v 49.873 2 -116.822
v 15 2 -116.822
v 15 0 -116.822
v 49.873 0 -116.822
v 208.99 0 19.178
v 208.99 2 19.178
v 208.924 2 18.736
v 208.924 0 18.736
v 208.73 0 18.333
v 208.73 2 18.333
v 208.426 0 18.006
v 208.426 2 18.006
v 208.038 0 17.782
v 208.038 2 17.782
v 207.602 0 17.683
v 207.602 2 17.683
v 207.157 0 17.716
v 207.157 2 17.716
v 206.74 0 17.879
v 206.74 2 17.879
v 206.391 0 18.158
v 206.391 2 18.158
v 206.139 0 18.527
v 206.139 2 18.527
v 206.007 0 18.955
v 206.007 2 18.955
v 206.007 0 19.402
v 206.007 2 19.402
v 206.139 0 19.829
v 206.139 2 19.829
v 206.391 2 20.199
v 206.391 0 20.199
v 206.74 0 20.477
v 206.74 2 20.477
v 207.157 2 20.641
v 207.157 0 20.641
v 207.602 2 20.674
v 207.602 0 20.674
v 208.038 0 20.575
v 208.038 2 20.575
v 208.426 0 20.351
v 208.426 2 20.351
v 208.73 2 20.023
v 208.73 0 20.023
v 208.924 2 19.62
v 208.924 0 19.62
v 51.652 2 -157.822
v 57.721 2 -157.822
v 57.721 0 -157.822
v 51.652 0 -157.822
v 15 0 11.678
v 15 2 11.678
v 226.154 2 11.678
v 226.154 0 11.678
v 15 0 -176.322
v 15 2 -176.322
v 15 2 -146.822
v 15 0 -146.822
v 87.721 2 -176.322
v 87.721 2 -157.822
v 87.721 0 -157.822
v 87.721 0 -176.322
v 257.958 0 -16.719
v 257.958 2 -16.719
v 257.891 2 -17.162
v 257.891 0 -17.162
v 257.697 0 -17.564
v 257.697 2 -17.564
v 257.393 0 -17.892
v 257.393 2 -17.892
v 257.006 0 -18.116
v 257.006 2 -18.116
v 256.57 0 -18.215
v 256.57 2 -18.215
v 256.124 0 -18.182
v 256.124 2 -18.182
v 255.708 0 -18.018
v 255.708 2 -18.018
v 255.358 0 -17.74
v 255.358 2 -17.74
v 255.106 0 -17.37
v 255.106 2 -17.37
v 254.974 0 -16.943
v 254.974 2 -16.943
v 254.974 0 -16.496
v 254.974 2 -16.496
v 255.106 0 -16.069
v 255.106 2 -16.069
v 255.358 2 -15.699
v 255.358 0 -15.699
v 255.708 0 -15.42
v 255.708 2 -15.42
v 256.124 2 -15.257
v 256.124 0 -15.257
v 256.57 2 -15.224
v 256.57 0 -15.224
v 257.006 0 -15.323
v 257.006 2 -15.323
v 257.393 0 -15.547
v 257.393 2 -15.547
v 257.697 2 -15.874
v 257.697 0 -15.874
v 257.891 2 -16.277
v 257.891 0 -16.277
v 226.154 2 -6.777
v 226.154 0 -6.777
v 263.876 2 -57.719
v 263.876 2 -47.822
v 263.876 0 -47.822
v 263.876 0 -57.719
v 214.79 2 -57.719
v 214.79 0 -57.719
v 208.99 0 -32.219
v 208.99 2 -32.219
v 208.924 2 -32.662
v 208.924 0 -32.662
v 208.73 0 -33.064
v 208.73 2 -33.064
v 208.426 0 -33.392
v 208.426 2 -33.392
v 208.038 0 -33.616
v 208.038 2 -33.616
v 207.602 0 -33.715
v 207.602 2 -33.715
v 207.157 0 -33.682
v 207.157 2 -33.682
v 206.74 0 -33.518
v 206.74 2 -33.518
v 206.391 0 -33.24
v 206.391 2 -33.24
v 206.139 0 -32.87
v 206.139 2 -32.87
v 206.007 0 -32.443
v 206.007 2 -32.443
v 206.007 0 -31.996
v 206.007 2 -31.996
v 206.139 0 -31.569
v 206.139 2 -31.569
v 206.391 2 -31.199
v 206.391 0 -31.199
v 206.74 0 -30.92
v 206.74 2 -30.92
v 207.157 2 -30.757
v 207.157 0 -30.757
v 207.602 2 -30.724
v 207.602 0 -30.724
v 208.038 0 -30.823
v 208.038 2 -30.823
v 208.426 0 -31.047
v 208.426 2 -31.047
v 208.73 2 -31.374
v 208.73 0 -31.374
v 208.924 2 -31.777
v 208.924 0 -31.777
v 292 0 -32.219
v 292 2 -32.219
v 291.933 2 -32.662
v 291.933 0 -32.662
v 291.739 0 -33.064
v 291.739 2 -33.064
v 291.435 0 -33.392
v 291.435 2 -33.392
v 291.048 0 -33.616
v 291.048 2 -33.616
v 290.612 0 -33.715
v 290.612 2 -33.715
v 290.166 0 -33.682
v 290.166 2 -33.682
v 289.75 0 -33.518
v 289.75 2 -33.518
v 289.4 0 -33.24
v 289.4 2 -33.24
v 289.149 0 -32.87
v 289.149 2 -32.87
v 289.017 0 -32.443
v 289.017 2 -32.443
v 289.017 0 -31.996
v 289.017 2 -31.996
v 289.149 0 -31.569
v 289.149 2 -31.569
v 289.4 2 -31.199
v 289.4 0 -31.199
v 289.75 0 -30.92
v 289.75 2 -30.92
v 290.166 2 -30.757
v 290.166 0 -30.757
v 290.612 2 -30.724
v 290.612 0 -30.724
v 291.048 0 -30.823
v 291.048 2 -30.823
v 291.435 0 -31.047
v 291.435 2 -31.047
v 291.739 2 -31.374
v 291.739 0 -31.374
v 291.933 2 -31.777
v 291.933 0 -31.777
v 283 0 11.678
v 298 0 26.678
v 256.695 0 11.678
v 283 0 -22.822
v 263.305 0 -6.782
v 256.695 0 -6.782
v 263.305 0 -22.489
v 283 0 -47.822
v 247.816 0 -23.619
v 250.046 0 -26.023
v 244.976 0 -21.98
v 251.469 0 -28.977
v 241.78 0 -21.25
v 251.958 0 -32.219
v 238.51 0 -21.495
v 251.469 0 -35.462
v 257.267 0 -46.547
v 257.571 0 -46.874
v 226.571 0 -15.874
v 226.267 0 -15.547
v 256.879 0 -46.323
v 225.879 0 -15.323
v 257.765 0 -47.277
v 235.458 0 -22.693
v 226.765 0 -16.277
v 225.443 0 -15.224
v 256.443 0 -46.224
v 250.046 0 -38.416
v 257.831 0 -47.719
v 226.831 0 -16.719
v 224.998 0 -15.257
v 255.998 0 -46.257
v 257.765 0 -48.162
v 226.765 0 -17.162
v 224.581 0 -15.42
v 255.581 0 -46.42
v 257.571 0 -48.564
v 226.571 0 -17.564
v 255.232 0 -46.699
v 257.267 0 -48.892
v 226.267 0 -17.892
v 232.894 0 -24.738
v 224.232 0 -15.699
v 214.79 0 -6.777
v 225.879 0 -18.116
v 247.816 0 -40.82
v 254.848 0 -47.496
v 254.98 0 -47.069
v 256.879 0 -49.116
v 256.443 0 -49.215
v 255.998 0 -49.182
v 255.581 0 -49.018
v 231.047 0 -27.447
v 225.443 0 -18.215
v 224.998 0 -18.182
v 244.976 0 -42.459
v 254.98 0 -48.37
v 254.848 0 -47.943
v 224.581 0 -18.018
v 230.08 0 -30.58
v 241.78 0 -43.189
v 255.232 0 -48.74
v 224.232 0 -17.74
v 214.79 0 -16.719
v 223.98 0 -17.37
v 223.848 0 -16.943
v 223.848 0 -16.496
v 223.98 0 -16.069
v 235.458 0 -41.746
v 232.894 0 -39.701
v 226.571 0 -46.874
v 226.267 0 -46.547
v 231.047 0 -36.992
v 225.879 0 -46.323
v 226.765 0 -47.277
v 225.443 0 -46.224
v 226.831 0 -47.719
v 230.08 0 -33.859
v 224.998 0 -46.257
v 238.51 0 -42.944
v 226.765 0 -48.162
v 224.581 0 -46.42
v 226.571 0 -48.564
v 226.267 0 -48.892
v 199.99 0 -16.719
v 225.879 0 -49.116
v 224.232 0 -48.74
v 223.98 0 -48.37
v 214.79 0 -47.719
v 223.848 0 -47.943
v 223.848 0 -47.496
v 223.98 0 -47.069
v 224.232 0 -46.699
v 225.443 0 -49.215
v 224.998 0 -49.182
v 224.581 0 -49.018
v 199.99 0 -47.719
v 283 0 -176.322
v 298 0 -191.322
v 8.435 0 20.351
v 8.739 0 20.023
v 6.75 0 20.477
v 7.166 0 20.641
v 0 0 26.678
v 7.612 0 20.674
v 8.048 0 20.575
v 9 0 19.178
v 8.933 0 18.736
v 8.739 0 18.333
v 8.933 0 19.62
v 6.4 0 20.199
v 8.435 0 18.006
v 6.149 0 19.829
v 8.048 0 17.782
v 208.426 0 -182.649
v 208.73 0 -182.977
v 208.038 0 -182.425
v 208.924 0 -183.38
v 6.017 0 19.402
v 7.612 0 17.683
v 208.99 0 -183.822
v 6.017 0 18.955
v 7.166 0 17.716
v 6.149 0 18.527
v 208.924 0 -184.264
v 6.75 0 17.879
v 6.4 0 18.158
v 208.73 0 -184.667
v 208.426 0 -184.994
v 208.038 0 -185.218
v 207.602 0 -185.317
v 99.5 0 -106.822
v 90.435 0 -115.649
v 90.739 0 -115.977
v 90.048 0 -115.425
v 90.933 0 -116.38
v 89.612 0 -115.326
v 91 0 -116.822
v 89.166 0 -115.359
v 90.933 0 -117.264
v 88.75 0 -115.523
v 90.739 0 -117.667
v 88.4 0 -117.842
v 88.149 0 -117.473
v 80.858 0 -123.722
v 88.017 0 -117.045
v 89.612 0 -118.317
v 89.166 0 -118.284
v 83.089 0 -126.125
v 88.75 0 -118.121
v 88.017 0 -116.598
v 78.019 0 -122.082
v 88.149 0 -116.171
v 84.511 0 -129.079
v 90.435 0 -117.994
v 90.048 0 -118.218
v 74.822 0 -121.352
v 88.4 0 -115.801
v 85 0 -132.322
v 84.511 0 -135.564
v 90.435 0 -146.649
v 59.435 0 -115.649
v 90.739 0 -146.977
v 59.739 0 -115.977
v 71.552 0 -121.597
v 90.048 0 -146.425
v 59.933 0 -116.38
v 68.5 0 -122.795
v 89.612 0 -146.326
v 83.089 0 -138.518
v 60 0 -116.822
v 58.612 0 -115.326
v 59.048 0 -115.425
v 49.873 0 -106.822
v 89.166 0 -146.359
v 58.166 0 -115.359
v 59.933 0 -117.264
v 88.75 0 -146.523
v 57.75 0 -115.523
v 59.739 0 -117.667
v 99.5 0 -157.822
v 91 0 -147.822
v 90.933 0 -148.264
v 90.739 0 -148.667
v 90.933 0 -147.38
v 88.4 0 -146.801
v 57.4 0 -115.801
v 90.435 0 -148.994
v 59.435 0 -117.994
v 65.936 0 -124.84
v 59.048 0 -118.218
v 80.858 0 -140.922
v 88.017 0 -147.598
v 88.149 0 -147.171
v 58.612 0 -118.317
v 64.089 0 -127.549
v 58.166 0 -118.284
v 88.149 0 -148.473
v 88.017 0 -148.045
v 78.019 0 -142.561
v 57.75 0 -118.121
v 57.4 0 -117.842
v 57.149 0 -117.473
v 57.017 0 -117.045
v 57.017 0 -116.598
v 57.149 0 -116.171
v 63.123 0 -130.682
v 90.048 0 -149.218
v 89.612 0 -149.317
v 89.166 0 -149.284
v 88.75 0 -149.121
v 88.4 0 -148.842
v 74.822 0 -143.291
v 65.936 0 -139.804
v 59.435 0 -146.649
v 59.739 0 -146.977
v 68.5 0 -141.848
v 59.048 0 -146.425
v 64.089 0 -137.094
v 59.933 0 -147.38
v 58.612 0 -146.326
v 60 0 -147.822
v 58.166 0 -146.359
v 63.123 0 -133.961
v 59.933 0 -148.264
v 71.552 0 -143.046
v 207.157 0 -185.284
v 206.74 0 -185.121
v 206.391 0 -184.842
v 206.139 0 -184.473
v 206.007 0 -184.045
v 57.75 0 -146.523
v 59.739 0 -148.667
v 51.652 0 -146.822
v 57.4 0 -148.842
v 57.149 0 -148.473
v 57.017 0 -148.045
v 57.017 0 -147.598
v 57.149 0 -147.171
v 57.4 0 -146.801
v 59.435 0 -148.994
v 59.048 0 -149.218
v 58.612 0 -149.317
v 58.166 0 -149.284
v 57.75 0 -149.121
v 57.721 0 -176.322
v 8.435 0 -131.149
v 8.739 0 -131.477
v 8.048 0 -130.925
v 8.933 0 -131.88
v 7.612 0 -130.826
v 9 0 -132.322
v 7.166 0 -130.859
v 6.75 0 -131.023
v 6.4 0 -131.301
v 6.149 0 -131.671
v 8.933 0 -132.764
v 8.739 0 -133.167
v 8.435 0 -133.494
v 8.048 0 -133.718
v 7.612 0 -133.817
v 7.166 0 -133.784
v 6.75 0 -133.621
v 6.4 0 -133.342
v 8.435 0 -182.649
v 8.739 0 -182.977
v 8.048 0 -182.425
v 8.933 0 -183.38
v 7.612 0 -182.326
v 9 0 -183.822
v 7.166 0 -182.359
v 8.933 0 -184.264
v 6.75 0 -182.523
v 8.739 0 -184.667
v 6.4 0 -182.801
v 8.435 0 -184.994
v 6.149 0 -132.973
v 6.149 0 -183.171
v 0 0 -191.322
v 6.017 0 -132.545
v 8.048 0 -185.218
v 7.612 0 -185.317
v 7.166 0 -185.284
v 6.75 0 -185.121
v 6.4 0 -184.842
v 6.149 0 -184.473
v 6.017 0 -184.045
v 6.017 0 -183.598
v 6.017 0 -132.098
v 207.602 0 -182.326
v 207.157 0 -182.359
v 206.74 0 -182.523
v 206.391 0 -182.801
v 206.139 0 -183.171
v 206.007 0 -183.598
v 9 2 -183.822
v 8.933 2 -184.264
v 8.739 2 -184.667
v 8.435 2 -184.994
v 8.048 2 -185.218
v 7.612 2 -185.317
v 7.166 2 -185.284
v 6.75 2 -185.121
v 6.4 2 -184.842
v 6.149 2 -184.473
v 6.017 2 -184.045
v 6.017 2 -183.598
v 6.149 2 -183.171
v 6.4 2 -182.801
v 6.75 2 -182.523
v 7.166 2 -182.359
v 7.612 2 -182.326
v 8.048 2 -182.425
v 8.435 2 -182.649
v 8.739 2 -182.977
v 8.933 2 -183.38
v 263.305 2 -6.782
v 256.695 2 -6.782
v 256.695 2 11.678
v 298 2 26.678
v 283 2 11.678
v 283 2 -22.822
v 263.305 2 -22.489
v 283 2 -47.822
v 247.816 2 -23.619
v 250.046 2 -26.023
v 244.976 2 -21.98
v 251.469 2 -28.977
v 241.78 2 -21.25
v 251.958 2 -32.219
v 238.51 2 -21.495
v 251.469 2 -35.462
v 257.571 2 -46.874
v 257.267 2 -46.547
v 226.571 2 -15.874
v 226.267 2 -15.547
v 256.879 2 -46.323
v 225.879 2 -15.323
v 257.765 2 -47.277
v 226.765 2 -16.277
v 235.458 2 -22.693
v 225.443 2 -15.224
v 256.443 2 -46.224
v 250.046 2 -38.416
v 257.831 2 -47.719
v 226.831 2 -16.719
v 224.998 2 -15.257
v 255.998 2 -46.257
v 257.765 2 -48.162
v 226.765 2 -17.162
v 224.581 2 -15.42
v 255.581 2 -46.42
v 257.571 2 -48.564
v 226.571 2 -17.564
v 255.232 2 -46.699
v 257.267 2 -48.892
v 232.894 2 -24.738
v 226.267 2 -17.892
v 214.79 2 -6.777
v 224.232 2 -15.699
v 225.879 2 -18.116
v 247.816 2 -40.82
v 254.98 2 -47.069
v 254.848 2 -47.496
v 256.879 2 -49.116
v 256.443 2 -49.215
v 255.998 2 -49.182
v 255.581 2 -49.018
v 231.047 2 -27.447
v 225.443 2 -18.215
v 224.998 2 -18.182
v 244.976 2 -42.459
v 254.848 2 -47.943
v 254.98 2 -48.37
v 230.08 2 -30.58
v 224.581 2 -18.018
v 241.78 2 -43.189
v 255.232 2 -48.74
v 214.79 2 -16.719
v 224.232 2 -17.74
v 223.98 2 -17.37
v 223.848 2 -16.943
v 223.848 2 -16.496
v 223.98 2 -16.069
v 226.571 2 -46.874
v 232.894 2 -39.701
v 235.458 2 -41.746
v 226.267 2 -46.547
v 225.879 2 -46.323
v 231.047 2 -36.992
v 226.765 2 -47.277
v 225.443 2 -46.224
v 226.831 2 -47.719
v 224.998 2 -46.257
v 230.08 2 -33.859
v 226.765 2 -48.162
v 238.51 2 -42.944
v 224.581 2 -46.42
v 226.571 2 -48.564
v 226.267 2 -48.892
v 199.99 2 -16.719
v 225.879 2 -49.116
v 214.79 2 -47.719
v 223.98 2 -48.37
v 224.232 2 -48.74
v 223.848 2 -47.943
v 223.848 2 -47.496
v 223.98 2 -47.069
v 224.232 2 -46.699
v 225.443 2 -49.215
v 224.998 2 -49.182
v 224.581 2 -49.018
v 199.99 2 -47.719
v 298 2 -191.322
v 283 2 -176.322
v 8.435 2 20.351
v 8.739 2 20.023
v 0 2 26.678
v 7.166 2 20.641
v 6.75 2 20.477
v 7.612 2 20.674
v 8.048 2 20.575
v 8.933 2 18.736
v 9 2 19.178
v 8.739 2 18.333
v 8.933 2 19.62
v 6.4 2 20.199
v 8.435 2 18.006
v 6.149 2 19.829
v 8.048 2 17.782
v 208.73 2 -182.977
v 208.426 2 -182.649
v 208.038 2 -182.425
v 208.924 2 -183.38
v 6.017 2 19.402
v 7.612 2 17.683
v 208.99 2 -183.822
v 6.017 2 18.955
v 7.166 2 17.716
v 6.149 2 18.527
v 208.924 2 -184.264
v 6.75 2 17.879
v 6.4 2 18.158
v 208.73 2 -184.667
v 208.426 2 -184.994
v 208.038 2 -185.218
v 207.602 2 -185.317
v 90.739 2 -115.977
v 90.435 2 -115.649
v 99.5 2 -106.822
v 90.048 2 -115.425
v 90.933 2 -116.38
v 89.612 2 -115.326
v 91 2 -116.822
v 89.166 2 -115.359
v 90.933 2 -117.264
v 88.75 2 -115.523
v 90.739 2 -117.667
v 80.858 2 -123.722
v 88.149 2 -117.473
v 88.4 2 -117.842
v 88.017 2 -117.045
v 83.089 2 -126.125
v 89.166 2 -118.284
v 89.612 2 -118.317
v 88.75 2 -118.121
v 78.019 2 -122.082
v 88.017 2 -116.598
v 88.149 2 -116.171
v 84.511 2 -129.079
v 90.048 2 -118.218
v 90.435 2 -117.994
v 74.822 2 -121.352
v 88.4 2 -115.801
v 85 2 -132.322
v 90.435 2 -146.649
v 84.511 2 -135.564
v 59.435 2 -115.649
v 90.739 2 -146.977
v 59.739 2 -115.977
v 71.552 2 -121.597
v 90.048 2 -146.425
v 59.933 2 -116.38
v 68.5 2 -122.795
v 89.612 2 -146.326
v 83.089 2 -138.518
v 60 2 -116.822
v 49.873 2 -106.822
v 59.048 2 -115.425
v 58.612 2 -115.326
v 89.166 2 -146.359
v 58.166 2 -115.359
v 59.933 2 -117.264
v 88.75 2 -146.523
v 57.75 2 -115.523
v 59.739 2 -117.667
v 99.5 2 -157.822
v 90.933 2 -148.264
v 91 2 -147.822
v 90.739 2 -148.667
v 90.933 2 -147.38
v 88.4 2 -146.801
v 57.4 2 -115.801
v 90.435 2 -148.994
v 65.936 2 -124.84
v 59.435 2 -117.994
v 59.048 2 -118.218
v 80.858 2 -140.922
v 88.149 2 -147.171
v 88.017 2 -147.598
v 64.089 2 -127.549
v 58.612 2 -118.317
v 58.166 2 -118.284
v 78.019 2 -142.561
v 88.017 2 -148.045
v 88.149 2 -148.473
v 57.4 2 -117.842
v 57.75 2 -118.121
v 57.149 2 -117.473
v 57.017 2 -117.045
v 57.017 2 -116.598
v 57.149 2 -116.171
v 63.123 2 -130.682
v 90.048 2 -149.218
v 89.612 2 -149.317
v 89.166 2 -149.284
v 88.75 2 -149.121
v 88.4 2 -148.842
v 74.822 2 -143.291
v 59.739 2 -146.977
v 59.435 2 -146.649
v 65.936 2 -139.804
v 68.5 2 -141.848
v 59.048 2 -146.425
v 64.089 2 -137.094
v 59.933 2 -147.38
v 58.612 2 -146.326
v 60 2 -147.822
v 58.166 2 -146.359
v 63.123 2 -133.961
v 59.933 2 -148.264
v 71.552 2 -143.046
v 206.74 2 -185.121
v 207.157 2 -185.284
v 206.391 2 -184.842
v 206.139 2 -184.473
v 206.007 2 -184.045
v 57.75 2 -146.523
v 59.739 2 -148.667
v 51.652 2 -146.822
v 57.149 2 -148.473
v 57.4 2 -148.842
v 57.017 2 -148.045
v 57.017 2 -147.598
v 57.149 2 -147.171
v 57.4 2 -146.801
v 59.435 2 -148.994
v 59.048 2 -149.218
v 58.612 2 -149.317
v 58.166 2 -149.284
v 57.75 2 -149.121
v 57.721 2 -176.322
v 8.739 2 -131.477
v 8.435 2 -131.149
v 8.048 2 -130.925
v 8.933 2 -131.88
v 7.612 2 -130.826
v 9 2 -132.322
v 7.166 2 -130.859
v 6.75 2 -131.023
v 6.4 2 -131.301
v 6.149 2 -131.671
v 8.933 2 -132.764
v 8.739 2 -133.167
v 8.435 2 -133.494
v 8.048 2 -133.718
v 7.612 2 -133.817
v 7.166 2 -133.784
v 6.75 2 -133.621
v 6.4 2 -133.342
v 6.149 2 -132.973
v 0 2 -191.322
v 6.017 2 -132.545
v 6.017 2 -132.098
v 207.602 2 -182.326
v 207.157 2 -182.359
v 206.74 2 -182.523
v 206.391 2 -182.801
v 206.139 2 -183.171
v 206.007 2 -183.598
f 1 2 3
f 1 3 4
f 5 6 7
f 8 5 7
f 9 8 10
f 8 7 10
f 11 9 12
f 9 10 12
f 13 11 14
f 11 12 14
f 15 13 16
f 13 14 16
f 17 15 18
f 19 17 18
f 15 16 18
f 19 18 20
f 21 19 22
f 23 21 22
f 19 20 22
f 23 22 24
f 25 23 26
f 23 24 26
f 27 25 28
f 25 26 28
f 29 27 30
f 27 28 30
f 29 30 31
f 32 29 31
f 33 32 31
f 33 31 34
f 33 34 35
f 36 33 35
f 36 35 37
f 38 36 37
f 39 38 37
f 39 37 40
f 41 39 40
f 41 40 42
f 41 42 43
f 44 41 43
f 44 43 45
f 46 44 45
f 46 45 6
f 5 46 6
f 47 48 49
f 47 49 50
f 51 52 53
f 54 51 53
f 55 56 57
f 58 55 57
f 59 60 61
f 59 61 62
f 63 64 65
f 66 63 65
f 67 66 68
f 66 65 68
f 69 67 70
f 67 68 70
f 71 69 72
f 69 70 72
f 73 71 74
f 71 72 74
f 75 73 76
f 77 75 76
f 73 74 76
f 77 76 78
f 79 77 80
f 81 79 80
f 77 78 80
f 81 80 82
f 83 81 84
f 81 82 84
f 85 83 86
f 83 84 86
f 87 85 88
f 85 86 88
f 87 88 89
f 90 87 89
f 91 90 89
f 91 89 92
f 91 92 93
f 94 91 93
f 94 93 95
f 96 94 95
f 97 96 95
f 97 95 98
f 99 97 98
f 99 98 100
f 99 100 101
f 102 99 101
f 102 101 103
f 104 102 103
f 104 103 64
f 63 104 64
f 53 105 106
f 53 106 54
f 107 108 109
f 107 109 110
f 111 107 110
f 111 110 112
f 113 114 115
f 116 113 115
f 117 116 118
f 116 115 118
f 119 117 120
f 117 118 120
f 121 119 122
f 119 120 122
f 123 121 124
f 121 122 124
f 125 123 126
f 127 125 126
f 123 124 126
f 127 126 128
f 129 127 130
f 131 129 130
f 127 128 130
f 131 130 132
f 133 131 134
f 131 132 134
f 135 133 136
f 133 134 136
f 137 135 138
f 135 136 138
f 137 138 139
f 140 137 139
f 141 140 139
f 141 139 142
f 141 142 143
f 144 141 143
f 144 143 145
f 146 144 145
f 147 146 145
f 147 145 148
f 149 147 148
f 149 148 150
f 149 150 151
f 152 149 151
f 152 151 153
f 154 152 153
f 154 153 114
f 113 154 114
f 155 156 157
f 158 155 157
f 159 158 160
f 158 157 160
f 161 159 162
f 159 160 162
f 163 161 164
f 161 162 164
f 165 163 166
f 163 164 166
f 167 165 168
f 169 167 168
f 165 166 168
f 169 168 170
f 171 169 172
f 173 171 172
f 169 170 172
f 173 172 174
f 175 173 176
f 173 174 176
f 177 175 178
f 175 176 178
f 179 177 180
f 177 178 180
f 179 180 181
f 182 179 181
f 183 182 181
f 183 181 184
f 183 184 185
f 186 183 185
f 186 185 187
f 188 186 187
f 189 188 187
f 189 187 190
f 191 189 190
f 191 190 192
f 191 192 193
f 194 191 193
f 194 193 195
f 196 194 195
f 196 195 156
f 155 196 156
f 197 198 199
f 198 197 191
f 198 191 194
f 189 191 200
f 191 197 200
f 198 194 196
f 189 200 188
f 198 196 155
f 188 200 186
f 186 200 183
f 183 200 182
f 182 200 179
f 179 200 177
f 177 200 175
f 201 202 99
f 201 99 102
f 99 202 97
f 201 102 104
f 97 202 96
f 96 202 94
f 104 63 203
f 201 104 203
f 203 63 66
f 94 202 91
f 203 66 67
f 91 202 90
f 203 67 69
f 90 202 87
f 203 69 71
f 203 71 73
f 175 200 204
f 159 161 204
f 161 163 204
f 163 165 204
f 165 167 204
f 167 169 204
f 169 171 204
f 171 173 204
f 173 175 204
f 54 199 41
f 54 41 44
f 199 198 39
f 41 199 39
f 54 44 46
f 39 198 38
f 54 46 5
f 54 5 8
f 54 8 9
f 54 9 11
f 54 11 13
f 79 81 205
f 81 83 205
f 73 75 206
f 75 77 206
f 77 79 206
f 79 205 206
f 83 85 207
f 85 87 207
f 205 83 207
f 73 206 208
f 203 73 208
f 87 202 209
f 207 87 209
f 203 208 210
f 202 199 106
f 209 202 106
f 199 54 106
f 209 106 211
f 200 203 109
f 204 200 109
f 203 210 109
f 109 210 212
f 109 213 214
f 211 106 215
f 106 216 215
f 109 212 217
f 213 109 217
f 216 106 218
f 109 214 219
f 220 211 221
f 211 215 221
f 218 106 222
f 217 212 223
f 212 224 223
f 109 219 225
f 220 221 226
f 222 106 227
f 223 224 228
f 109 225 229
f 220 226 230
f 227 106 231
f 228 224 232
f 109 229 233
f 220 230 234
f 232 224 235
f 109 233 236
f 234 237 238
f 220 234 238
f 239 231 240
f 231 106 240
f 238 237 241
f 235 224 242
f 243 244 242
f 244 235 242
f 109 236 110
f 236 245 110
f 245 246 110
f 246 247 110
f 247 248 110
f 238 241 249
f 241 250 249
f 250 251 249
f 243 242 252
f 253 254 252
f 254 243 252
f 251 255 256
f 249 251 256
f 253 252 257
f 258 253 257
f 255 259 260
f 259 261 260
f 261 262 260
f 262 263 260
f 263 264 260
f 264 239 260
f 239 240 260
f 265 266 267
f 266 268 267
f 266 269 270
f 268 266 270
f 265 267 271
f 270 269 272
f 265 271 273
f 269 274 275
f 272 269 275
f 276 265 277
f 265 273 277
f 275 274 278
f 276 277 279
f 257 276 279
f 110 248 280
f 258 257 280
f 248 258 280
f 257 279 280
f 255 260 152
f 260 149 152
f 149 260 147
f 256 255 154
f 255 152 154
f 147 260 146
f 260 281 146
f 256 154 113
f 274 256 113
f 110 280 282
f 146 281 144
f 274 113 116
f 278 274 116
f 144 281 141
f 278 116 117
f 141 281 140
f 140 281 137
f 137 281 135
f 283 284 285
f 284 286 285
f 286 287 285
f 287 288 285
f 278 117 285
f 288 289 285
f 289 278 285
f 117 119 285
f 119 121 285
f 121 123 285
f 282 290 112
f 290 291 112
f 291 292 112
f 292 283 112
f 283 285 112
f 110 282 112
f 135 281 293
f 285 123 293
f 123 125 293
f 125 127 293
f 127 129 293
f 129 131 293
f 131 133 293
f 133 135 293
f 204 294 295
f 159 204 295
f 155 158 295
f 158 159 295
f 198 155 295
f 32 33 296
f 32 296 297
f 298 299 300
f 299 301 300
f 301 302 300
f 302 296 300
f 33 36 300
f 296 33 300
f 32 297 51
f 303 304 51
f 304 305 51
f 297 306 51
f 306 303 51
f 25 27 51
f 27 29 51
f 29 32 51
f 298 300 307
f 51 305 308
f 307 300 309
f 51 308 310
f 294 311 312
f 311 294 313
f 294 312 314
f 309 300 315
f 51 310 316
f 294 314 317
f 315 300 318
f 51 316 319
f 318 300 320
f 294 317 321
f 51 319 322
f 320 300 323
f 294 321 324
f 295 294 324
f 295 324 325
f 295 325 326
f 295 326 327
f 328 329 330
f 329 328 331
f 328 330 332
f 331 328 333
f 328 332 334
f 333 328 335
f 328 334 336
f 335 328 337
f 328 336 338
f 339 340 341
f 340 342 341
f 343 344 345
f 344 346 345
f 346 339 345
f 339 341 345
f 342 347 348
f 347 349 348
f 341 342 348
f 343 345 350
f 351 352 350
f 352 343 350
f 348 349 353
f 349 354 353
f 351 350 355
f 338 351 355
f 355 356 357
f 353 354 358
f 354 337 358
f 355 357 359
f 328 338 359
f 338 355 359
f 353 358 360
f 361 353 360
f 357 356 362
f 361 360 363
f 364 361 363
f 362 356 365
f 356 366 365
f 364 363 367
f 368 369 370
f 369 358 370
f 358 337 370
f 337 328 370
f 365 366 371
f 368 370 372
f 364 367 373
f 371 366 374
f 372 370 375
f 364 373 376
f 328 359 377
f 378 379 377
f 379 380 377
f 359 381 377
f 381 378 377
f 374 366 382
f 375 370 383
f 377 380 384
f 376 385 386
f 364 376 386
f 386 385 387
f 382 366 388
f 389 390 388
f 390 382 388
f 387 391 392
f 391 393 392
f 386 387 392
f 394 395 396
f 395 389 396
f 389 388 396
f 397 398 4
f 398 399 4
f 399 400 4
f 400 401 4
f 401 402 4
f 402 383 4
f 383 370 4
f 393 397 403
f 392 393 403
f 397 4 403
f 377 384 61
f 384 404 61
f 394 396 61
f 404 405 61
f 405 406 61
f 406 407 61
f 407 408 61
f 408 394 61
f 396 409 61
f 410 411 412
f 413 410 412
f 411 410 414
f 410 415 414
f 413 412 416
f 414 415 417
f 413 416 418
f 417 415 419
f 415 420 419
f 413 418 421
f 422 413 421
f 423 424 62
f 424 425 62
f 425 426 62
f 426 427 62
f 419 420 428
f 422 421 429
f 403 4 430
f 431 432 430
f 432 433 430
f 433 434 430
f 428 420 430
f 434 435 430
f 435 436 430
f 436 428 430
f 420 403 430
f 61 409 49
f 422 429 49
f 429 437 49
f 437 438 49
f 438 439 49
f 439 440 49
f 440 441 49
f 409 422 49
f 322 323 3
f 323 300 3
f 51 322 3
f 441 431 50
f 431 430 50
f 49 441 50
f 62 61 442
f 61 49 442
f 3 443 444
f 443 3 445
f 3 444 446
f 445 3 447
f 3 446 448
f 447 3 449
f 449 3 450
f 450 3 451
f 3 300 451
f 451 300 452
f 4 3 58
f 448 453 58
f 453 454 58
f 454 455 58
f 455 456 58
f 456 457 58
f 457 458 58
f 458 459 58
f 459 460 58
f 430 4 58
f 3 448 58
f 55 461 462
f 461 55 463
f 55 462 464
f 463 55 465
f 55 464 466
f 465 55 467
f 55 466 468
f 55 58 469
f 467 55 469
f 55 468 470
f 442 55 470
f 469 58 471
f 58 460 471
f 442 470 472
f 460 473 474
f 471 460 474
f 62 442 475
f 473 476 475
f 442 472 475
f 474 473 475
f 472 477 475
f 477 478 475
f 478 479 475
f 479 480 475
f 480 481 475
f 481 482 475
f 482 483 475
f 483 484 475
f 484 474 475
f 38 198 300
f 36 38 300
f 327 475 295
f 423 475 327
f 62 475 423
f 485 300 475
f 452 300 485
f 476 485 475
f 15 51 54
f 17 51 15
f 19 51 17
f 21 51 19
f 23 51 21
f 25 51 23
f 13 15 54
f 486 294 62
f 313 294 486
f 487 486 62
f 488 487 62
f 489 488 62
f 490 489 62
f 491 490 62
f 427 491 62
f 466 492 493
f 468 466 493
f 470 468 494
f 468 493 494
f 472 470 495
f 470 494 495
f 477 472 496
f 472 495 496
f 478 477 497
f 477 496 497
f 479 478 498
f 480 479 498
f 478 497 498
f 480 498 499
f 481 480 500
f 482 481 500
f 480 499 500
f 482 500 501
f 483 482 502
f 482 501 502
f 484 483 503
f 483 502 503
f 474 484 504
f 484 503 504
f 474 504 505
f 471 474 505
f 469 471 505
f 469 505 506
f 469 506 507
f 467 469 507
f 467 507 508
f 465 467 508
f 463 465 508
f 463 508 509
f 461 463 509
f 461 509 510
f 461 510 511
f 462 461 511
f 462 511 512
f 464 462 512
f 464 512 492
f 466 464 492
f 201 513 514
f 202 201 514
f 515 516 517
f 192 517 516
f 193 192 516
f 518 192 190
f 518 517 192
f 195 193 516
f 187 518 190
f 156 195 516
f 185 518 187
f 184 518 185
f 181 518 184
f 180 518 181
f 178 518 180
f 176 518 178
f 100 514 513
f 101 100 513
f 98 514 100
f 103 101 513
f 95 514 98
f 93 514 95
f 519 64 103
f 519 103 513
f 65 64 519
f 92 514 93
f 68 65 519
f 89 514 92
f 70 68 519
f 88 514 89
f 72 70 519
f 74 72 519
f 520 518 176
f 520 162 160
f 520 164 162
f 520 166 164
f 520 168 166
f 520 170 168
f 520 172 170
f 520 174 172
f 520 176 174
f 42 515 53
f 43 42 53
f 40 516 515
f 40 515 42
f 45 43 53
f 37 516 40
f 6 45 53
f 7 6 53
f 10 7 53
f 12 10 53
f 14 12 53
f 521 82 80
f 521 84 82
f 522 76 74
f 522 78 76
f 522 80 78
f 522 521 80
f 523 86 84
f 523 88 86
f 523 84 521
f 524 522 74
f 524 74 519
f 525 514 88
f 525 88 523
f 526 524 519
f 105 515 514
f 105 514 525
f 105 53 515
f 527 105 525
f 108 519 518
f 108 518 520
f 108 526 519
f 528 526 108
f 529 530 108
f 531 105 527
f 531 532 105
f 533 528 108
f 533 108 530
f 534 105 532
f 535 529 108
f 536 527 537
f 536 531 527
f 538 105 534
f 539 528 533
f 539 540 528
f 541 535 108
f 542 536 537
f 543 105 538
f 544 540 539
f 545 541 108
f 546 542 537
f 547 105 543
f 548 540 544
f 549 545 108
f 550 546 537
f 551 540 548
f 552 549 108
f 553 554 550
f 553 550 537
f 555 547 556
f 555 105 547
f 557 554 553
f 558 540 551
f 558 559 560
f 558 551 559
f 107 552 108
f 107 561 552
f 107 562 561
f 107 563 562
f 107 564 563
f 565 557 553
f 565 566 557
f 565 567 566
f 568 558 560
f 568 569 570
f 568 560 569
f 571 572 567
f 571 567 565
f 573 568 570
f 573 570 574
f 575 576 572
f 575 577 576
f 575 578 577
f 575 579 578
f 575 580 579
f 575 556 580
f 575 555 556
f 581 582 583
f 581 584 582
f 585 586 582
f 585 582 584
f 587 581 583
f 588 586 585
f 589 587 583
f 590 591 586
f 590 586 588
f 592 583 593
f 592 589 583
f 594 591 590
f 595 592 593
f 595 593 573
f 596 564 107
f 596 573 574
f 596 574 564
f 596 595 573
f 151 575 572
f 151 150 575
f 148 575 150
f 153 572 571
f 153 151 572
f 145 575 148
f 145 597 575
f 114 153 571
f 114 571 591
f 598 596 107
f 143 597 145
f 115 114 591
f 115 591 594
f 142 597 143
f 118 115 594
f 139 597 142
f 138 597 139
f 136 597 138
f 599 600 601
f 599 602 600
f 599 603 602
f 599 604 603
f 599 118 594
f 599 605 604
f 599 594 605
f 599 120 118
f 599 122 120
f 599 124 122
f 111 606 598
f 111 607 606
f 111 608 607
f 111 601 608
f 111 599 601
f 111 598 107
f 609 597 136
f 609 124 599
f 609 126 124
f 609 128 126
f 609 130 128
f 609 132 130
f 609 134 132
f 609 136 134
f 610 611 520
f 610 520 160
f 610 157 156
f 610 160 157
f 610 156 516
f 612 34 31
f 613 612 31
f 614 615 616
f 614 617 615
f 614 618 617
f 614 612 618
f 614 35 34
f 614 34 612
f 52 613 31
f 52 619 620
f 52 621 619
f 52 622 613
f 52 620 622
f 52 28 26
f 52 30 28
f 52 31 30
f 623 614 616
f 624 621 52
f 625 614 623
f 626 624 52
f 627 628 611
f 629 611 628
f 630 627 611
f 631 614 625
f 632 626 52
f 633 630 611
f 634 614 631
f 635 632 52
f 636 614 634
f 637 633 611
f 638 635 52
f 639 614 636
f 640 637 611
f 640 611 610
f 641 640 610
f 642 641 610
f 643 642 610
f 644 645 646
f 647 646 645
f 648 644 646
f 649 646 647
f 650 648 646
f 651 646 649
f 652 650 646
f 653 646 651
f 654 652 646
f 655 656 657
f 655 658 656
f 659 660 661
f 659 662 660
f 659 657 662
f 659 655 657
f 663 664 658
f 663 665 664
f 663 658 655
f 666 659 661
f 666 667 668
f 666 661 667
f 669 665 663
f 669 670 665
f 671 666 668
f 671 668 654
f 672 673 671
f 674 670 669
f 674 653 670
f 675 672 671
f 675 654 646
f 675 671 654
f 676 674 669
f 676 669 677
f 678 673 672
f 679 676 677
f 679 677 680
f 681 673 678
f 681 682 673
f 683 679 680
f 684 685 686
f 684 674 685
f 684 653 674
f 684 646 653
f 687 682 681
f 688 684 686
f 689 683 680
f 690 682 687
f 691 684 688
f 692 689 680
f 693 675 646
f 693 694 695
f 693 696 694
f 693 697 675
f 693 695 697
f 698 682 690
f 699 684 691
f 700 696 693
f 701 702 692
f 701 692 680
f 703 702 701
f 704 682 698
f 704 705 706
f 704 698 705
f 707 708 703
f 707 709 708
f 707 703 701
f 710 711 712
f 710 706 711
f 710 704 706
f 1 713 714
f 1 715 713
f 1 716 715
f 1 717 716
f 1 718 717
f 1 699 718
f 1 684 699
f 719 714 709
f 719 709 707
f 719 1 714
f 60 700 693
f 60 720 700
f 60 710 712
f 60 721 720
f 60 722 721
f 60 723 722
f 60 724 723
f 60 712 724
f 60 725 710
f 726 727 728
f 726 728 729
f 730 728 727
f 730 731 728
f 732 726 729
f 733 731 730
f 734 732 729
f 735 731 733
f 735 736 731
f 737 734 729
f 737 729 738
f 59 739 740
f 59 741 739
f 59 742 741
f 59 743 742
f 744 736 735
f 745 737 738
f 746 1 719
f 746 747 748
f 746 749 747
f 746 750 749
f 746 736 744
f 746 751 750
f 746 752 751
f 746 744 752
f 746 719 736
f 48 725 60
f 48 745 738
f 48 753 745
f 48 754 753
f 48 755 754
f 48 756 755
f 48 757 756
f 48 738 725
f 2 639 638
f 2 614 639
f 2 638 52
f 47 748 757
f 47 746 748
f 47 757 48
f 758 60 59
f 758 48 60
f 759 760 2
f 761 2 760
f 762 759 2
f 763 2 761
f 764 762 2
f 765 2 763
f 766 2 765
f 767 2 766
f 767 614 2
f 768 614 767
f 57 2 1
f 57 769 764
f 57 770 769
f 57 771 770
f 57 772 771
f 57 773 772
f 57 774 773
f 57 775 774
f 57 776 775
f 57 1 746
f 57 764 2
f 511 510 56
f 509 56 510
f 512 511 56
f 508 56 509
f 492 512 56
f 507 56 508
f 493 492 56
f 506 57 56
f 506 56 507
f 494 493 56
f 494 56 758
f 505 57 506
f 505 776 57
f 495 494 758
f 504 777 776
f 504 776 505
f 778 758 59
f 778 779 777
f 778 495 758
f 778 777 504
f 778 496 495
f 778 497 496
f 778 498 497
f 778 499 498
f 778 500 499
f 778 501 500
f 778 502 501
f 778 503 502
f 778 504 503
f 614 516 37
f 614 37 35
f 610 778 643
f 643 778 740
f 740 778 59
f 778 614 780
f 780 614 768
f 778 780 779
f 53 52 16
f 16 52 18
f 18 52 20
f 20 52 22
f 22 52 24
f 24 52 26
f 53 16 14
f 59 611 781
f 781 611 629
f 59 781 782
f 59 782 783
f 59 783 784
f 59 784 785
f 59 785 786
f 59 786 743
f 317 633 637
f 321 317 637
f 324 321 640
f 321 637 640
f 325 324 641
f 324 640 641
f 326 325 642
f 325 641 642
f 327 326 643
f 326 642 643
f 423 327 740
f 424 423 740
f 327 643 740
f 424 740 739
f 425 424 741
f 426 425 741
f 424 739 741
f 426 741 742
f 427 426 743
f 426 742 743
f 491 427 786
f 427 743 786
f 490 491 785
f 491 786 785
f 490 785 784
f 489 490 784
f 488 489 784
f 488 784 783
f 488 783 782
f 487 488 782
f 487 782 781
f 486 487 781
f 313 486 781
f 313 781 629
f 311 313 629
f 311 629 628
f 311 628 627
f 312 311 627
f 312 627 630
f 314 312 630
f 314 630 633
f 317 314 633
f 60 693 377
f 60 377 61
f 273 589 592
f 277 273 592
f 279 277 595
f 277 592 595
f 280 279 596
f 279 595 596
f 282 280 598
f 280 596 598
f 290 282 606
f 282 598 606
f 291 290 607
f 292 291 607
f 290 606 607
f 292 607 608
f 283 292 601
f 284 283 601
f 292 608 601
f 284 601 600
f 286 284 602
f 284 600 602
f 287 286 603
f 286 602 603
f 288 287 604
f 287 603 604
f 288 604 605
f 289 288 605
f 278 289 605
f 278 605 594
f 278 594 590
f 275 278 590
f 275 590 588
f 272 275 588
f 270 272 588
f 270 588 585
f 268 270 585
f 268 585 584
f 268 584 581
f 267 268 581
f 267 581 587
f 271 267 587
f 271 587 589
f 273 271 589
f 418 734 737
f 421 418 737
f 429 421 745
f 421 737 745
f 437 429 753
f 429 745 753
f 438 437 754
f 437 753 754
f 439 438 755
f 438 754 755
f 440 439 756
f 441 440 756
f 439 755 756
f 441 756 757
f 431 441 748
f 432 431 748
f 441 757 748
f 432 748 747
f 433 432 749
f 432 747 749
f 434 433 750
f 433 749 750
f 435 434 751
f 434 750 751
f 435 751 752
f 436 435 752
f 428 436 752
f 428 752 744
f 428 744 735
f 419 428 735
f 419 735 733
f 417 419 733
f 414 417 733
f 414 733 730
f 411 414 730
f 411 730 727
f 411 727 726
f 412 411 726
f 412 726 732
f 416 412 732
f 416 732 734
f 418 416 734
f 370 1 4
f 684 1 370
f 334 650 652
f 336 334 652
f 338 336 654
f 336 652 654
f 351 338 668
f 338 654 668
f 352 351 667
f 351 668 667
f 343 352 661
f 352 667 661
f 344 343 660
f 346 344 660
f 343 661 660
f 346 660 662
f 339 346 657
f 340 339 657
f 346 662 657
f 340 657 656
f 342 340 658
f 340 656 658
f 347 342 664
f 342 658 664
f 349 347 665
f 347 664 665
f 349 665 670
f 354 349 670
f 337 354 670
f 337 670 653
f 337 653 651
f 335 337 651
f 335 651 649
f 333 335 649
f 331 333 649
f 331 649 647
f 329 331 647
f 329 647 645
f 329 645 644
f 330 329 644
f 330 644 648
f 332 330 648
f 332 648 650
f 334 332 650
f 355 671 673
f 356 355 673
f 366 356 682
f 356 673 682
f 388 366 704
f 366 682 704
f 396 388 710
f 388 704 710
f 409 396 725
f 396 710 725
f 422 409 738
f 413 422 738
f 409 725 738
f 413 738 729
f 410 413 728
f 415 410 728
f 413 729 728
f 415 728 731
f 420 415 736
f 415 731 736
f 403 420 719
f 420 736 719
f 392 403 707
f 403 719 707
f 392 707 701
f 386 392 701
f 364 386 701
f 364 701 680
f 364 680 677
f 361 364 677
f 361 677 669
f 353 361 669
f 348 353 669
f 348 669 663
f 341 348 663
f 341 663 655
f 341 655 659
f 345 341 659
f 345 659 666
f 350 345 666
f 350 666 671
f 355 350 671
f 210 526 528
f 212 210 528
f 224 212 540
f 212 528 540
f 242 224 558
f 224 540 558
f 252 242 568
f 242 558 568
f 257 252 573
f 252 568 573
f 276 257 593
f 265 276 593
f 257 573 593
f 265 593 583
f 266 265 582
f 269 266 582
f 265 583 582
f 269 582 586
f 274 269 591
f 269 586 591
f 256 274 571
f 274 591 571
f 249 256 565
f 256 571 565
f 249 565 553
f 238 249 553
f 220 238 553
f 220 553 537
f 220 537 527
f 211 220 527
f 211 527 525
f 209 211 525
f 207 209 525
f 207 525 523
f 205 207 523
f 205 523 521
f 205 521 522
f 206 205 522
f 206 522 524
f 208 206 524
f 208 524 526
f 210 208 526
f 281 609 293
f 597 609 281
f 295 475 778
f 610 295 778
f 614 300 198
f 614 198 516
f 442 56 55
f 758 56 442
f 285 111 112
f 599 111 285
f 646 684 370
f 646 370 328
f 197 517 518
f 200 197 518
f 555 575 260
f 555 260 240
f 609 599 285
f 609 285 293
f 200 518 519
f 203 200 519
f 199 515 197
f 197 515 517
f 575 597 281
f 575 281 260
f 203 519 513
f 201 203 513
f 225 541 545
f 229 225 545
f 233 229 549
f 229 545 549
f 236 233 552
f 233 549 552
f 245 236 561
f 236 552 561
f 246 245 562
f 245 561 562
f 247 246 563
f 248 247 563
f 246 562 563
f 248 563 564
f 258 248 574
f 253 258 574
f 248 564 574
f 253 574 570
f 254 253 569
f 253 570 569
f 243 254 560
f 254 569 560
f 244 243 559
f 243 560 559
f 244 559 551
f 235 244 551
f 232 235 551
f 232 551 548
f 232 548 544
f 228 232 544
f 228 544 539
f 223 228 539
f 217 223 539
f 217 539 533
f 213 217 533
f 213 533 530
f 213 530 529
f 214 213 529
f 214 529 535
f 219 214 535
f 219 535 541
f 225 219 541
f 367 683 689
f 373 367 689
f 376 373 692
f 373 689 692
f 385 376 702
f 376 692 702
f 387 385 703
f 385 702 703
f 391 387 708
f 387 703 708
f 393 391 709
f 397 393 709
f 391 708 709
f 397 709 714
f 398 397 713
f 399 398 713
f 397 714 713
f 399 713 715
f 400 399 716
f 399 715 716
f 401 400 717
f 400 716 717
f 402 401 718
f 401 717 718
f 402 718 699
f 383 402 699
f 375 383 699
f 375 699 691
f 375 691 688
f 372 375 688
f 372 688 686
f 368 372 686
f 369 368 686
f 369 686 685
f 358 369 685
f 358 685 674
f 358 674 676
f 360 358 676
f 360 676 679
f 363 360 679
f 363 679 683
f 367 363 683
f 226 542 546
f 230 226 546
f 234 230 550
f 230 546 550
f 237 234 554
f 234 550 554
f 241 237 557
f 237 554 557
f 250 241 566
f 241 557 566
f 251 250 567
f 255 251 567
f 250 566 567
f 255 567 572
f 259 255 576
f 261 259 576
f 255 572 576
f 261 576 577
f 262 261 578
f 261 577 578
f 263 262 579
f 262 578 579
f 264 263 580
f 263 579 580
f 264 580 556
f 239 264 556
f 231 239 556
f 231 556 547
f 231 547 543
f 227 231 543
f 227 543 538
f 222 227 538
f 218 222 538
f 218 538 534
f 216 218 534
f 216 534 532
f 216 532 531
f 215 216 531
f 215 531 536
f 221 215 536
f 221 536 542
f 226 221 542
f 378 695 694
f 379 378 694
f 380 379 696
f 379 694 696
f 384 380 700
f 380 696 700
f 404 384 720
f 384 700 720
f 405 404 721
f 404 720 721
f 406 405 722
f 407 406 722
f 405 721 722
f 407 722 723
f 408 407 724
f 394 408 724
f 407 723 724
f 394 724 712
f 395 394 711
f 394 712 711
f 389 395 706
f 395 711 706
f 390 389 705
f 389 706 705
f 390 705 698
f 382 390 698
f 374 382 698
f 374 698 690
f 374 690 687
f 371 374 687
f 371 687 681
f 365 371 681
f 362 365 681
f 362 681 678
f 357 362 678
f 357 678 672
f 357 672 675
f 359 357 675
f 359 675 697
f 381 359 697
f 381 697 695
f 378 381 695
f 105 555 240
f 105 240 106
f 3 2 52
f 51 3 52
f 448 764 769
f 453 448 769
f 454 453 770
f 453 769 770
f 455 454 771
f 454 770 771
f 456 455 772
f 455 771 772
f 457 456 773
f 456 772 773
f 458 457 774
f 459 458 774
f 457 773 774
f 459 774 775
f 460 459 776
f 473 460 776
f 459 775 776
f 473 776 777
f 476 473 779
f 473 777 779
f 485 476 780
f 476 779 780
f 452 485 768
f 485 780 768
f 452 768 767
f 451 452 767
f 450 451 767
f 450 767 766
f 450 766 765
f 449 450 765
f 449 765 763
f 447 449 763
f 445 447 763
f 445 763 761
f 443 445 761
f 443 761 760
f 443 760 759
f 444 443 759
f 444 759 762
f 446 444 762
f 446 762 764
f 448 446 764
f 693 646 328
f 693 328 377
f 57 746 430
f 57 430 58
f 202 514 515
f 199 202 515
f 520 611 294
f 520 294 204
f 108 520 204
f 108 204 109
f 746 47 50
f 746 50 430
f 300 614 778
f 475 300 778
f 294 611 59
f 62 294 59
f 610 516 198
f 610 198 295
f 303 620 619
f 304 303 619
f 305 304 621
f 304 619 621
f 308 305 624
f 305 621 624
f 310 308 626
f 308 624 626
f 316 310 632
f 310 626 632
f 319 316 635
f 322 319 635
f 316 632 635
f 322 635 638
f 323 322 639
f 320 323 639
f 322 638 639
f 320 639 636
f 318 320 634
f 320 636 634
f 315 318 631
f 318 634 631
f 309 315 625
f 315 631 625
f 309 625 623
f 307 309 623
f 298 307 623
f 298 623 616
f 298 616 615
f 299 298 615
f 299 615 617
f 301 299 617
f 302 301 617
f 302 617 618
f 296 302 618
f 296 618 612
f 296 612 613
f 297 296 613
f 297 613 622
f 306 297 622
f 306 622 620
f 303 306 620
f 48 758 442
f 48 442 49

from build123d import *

# Parameters (mm, degrees)
SKETCH1_W           = 218
SKETCH1_H           = 2
BOSS_EXTRUDE1_DEPTH = 298
SKETCH2_R           = 11
SKETCH2_R_2         = 1.5
CUT_EXTRUDE1_DEPTH  = 10


with BuildPart() as part:
    # Sketch1 → Boss-Extrude1 (new body)
    with BuildSketch(Plane(origin=(0, 0, 0), x_dir=(0, 0, -1), z_dir=(1, 0, 0))):
        with Locations((82.3216851, 1)):
            Rectangle(SKETCH1_W, SKETCH1_H)
    extrude(amount=BOSS_EXTRUDE1_DEPTH)

    # Sketch2 → Cut-Extrude1 (cut)
    with BuildSketch(Plane(origin=(0, 2, 0), x_dir=(1, 0, 0), z_dir=(0, 1, 0))):
        with Locations((74, 132.3216851)):
            Circle(SKETCH2_R)
        with Locations((89.5, 116.8216851)):
            Circle(SKETCH2_R_2)
        with Locations((58.5, 116.8216851)):
            Circle(SKETCH2_R_2)
        with Locations((89.5, 147.8216851)):
            Circle(SKETCH2_R_2)
        with Locations((58.5, 147.8216851)):
            Circle(SKETCH2_R_2)
        with Locations((256.33130124, 47.719426297)):
            Circle(SKETCH2_R_2)
        with Locations((256.457517214, 16.719426297)):
            Circle(SKETCH2_R_2)
        with Locations((225.33130124, 16.719426297)):
            Circle(SKETCH2_R_2)
        with Locations((225.33130124, 47.719426297)):
            Circle(SKETCH2_R_2)
        with Locations((240.957517214, 32.219426297)):
            Circle(SKETCH2_R)
        with Locations((290.5, 32.219426297)):
            Circle(SKETCH2_R_2)
        with Locations((7.5, 132.3216851)):
            Circle(SKETCH2_R_2)
        with Locations((207.490401532, 32.219426297)):
            Circle(SKETCH2_R_2)
        with Locations((207.490401532, 183.8216851)):
            Circle(SKETCH2_R_2)
        with Locations((207.490401532, -19.1783149)):
            Circle(SKETCH2_R_2)
        with Locations((7.5, -19.1783149)):
            Circle(SKETCH2_R_2)
        with Locations((7.5, 183.8216851)):
            Circle(SKETCH2_R_2)
        Polygon((15, 176.3216851), (57.721228679, 176.3216851), (57.721228679, 157.8216851), (51.65209525, 157.8216851), (51.65209525, 146.8216851), (15, 146.8216851), (15, 159.517007057), align=None)
        Polygon((149, -11.6783149), (104.471210326, -11.6783149), (15, -11.6783149), (15, 89.941809838), (15, 116.8216851), (49.873323929, 116.8216851), (49.873323929, 106.8216851), (99.5, 106.8216851), (99.5, 157.8216851), (87.721228679, 157.8216851), (87.721228679, 176.3216851), (101.200621078, 176.3216851), (149, 176.3216851), (283, 176.3216851), (283, 47.8216851), (263.876177895, 47.8216851), (263.876177895, 57.719426297), (214.790401532, 57.719426297), (214.790401532, 47.719426297), (199.990401532, 47.719426297), (199.990401532, 16.719426297), (214.790401532, 16.719426297), (214.790401532, 6.77711424), (226.154489119, 6.77711424), (226.154489119, -11.6783149), align=None)
        Polygon((283, -11.6783149), (283, 10.126363143), (283, 22.8216851), (263.305421964, 22.488619524), (263.305421964, 6.7816851), (256.695388827, 6.7816851), (256.695388827, -11.6783149), align=None)
    extrude(amount=-CUT_EXTRUDE1_DEPTH, mode=Mode.SUBTRACT)


solid = part.part
